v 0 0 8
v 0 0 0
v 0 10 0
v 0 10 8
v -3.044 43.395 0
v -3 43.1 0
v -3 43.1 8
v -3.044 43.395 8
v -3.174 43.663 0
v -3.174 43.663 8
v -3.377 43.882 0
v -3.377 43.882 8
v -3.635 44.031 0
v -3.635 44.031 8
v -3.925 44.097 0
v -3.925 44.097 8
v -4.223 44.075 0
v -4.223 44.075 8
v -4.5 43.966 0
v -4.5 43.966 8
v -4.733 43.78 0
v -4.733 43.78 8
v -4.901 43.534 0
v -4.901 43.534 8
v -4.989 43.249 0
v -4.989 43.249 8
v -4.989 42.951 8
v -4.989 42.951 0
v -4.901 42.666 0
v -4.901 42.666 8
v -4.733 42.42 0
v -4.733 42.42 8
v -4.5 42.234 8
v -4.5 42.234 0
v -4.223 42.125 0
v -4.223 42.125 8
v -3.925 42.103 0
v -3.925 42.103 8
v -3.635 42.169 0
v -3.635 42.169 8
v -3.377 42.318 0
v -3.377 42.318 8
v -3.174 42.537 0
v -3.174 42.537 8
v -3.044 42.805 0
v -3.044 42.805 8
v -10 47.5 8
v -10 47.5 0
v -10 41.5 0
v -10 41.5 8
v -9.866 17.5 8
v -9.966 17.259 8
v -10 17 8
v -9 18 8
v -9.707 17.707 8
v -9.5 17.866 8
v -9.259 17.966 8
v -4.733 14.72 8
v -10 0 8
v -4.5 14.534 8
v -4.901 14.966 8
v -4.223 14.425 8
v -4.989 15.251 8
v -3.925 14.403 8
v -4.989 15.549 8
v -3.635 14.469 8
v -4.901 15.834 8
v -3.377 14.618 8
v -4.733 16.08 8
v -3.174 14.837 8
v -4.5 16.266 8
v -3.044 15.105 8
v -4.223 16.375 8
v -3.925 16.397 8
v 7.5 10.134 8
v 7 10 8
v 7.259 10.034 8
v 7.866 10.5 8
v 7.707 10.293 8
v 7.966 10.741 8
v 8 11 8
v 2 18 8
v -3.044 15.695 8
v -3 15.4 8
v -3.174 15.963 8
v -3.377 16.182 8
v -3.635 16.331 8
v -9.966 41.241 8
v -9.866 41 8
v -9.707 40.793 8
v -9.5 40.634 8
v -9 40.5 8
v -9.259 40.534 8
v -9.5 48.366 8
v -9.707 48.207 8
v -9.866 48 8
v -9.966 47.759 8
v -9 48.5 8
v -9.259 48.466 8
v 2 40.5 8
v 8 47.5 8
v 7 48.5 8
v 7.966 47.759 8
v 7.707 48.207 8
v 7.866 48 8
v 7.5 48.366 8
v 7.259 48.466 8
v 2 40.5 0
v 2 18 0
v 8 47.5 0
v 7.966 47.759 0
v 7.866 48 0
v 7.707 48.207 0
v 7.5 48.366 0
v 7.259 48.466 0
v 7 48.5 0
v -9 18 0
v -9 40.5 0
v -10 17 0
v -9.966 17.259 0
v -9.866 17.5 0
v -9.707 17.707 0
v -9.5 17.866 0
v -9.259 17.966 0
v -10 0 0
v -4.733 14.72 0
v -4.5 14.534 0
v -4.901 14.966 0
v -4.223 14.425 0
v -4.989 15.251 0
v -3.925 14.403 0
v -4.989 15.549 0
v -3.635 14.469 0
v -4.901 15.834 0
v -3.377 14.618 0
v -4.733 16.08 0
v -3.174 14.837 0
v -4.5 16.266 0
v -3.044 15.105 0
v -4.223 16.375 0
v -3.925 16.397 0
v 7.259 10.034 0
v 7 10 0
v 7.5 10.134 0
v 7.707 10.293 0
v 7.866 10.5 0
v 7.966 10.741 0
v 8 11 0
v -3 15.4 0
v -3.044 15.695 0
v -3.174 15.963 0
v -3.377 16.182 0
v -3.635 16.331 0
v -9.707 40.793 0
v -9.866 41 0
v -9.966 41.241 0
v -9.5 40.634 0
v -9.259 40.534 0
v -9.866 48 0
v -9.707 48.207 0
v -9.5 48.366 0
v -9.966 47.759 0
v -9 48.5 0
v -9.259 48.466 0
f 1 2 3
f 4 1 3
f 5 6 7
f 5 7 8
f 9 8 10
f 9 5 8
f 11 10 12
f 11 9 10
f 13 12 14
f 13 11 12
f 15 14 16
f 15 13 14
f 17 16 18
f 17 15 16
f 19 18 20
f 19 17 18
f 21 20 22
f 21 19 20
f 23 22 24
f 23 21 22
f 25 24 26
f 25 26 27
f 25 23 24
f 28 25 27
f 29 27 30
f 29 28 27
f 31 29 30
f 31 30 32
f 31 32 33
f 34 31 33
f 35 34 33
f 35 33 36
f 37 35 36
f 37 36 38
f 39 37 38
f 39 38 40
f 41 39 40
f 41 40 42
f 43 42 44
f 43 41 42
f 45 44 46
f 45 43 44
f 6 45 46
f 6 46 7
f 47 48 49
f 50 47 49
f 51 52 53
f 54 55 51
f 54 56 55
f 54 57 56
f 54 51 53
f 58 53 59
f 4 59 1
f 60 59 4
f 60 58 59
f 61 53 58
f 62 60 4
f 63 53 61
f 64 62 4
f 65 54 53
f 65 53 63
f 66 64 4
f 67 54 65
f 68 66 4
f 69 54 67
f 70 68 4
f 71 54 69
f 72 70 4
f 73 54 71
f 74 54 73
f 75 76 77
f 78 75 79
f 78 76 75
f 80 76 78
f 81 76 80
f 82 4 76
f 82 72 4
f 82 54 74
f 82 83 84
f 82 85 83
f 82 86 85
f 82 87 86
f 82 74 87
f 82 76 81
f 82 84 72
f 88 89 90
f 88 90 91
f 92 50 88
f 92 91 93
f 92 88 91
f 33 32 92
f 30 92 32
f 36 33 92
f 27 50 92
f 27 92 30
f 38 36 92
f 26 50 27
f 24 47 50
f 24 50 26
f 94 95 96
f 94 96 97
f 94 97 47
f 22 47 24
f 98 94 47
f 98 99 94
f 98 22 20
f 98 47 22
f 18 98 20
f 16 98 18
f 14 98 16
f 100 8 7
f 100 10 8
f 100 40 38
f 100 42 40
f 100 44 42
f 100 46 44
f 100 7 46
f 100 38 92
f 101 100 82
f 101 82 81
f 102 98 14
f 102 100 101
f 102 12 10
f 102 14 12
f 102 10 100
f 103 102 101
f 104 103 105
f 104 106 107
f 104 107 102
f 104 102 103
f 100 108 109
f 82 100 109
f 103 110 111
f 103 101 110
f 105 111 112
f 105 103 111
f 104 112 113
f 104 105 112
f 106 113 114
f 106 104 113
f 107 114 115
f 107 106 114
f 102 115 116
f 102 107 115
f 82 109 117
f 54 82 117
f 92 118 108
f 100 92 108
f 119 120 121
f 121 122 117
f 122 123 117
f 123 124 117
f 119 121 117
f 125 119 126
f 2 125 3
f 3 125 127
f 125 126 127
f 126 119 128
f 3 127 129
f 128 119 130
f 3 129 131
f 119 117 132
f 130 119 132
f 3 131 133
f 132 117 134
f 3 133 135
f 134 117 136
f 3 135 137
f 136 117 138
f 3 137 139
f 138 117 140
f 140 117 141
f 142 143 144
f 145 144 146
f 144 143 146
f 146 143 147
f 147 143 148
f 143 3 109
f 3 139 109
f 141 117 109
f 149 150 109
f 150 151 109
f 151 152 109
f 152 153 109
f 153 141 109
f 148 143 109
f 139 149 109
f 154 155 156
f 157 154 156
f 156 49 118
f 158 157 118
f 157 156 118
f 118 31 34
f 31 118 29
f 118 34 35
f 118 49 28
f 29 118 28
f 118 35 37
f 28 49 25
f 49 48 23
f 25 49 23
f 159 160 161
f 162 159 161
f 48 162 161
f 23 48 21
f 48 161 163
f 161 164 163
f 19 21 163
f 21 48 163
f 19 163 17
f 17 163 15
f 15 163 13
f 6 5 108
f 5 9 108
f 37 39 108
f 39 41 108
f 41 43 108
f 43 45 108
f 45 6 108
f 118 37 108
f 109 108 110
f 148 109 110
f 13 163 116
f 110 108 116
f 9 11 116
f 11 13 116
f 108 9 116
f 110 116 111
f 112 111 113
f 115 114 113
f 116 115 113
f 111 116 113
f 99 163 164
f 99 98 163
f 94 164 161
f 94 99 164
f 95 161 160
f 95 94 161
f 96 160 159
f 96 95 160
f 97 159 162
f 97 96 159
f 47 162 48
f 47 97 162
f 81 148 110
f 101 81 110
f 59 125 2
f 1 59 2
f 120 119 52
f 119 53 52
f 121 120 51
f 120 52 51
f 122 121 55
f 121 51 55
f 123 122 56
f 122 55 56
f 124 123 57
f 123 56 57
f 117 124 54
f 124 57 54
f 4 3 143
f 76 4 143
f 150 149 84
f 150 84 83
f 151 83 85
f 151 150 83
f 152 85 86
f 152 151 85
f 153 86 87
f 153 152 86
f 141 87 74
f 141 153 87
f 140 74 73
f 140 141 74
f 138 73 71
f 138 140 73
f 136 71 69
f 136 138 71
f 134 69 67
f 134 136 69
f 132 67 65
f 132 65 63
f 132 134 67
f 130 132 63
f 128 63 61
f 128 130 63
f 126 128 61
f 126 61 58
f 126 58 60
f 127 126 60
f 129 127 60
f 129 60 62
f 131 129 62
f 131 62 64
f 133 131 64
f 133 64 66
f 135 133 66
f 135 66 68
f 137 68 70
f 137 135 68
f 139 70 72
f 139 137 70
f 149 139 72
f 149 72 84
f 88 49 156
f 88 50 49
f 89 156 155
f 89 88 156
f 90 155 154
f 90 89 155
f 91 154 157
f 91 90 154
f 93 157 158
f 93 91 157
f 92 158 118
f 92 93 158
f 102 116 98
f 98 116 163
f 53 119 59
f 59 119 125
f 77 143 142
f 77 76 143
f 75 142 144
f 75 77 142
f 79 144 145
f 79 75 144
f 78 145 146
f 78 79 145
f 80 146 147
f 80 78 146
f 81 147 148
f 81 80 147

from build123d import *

# Parameters (mm, degrees)
SKETCH1_R           = 1
BOSS_EXTRUDE1_DEPTH = 8
FILLET1_R           = 1


with BuildPart() as part:
    # Sketch1 → Boss-Extrude1 (new body)
    with BuildSketch(Plane.XY):
        Polygon((0, 0), (0, 10), (8, 10), (8, 48.5), (-10, 48.5), (-10, 40.5), (2, 40.5), (2, 18), (-10, 18), (-10, 10), (-10, 0), align=None)
        with Locations((-4, 43.1)):
            Circle(SKETCH1_R, mode=Mode.SUBTRACT)
        with Locations((-4, 15.4)):
            Circle(SKETCH1_R, mode=Mode.SUBTRACT)
    extrude(amount=BOSS_EXTRUDE1_DEPTH)

    # Fillet1
    fillet1_edges = [part.edges().sort_by_distance(p)[0] for p in [
        (-10, 18, 4),
        (-10, 40.5, 4),
        (-10, 48.5, 4),
        (8, 48.5, 4),
        (8, 10, 4),
    ]]
    fillet(fillet1_edges, radius=FILLET1_R)


solid = part.part
